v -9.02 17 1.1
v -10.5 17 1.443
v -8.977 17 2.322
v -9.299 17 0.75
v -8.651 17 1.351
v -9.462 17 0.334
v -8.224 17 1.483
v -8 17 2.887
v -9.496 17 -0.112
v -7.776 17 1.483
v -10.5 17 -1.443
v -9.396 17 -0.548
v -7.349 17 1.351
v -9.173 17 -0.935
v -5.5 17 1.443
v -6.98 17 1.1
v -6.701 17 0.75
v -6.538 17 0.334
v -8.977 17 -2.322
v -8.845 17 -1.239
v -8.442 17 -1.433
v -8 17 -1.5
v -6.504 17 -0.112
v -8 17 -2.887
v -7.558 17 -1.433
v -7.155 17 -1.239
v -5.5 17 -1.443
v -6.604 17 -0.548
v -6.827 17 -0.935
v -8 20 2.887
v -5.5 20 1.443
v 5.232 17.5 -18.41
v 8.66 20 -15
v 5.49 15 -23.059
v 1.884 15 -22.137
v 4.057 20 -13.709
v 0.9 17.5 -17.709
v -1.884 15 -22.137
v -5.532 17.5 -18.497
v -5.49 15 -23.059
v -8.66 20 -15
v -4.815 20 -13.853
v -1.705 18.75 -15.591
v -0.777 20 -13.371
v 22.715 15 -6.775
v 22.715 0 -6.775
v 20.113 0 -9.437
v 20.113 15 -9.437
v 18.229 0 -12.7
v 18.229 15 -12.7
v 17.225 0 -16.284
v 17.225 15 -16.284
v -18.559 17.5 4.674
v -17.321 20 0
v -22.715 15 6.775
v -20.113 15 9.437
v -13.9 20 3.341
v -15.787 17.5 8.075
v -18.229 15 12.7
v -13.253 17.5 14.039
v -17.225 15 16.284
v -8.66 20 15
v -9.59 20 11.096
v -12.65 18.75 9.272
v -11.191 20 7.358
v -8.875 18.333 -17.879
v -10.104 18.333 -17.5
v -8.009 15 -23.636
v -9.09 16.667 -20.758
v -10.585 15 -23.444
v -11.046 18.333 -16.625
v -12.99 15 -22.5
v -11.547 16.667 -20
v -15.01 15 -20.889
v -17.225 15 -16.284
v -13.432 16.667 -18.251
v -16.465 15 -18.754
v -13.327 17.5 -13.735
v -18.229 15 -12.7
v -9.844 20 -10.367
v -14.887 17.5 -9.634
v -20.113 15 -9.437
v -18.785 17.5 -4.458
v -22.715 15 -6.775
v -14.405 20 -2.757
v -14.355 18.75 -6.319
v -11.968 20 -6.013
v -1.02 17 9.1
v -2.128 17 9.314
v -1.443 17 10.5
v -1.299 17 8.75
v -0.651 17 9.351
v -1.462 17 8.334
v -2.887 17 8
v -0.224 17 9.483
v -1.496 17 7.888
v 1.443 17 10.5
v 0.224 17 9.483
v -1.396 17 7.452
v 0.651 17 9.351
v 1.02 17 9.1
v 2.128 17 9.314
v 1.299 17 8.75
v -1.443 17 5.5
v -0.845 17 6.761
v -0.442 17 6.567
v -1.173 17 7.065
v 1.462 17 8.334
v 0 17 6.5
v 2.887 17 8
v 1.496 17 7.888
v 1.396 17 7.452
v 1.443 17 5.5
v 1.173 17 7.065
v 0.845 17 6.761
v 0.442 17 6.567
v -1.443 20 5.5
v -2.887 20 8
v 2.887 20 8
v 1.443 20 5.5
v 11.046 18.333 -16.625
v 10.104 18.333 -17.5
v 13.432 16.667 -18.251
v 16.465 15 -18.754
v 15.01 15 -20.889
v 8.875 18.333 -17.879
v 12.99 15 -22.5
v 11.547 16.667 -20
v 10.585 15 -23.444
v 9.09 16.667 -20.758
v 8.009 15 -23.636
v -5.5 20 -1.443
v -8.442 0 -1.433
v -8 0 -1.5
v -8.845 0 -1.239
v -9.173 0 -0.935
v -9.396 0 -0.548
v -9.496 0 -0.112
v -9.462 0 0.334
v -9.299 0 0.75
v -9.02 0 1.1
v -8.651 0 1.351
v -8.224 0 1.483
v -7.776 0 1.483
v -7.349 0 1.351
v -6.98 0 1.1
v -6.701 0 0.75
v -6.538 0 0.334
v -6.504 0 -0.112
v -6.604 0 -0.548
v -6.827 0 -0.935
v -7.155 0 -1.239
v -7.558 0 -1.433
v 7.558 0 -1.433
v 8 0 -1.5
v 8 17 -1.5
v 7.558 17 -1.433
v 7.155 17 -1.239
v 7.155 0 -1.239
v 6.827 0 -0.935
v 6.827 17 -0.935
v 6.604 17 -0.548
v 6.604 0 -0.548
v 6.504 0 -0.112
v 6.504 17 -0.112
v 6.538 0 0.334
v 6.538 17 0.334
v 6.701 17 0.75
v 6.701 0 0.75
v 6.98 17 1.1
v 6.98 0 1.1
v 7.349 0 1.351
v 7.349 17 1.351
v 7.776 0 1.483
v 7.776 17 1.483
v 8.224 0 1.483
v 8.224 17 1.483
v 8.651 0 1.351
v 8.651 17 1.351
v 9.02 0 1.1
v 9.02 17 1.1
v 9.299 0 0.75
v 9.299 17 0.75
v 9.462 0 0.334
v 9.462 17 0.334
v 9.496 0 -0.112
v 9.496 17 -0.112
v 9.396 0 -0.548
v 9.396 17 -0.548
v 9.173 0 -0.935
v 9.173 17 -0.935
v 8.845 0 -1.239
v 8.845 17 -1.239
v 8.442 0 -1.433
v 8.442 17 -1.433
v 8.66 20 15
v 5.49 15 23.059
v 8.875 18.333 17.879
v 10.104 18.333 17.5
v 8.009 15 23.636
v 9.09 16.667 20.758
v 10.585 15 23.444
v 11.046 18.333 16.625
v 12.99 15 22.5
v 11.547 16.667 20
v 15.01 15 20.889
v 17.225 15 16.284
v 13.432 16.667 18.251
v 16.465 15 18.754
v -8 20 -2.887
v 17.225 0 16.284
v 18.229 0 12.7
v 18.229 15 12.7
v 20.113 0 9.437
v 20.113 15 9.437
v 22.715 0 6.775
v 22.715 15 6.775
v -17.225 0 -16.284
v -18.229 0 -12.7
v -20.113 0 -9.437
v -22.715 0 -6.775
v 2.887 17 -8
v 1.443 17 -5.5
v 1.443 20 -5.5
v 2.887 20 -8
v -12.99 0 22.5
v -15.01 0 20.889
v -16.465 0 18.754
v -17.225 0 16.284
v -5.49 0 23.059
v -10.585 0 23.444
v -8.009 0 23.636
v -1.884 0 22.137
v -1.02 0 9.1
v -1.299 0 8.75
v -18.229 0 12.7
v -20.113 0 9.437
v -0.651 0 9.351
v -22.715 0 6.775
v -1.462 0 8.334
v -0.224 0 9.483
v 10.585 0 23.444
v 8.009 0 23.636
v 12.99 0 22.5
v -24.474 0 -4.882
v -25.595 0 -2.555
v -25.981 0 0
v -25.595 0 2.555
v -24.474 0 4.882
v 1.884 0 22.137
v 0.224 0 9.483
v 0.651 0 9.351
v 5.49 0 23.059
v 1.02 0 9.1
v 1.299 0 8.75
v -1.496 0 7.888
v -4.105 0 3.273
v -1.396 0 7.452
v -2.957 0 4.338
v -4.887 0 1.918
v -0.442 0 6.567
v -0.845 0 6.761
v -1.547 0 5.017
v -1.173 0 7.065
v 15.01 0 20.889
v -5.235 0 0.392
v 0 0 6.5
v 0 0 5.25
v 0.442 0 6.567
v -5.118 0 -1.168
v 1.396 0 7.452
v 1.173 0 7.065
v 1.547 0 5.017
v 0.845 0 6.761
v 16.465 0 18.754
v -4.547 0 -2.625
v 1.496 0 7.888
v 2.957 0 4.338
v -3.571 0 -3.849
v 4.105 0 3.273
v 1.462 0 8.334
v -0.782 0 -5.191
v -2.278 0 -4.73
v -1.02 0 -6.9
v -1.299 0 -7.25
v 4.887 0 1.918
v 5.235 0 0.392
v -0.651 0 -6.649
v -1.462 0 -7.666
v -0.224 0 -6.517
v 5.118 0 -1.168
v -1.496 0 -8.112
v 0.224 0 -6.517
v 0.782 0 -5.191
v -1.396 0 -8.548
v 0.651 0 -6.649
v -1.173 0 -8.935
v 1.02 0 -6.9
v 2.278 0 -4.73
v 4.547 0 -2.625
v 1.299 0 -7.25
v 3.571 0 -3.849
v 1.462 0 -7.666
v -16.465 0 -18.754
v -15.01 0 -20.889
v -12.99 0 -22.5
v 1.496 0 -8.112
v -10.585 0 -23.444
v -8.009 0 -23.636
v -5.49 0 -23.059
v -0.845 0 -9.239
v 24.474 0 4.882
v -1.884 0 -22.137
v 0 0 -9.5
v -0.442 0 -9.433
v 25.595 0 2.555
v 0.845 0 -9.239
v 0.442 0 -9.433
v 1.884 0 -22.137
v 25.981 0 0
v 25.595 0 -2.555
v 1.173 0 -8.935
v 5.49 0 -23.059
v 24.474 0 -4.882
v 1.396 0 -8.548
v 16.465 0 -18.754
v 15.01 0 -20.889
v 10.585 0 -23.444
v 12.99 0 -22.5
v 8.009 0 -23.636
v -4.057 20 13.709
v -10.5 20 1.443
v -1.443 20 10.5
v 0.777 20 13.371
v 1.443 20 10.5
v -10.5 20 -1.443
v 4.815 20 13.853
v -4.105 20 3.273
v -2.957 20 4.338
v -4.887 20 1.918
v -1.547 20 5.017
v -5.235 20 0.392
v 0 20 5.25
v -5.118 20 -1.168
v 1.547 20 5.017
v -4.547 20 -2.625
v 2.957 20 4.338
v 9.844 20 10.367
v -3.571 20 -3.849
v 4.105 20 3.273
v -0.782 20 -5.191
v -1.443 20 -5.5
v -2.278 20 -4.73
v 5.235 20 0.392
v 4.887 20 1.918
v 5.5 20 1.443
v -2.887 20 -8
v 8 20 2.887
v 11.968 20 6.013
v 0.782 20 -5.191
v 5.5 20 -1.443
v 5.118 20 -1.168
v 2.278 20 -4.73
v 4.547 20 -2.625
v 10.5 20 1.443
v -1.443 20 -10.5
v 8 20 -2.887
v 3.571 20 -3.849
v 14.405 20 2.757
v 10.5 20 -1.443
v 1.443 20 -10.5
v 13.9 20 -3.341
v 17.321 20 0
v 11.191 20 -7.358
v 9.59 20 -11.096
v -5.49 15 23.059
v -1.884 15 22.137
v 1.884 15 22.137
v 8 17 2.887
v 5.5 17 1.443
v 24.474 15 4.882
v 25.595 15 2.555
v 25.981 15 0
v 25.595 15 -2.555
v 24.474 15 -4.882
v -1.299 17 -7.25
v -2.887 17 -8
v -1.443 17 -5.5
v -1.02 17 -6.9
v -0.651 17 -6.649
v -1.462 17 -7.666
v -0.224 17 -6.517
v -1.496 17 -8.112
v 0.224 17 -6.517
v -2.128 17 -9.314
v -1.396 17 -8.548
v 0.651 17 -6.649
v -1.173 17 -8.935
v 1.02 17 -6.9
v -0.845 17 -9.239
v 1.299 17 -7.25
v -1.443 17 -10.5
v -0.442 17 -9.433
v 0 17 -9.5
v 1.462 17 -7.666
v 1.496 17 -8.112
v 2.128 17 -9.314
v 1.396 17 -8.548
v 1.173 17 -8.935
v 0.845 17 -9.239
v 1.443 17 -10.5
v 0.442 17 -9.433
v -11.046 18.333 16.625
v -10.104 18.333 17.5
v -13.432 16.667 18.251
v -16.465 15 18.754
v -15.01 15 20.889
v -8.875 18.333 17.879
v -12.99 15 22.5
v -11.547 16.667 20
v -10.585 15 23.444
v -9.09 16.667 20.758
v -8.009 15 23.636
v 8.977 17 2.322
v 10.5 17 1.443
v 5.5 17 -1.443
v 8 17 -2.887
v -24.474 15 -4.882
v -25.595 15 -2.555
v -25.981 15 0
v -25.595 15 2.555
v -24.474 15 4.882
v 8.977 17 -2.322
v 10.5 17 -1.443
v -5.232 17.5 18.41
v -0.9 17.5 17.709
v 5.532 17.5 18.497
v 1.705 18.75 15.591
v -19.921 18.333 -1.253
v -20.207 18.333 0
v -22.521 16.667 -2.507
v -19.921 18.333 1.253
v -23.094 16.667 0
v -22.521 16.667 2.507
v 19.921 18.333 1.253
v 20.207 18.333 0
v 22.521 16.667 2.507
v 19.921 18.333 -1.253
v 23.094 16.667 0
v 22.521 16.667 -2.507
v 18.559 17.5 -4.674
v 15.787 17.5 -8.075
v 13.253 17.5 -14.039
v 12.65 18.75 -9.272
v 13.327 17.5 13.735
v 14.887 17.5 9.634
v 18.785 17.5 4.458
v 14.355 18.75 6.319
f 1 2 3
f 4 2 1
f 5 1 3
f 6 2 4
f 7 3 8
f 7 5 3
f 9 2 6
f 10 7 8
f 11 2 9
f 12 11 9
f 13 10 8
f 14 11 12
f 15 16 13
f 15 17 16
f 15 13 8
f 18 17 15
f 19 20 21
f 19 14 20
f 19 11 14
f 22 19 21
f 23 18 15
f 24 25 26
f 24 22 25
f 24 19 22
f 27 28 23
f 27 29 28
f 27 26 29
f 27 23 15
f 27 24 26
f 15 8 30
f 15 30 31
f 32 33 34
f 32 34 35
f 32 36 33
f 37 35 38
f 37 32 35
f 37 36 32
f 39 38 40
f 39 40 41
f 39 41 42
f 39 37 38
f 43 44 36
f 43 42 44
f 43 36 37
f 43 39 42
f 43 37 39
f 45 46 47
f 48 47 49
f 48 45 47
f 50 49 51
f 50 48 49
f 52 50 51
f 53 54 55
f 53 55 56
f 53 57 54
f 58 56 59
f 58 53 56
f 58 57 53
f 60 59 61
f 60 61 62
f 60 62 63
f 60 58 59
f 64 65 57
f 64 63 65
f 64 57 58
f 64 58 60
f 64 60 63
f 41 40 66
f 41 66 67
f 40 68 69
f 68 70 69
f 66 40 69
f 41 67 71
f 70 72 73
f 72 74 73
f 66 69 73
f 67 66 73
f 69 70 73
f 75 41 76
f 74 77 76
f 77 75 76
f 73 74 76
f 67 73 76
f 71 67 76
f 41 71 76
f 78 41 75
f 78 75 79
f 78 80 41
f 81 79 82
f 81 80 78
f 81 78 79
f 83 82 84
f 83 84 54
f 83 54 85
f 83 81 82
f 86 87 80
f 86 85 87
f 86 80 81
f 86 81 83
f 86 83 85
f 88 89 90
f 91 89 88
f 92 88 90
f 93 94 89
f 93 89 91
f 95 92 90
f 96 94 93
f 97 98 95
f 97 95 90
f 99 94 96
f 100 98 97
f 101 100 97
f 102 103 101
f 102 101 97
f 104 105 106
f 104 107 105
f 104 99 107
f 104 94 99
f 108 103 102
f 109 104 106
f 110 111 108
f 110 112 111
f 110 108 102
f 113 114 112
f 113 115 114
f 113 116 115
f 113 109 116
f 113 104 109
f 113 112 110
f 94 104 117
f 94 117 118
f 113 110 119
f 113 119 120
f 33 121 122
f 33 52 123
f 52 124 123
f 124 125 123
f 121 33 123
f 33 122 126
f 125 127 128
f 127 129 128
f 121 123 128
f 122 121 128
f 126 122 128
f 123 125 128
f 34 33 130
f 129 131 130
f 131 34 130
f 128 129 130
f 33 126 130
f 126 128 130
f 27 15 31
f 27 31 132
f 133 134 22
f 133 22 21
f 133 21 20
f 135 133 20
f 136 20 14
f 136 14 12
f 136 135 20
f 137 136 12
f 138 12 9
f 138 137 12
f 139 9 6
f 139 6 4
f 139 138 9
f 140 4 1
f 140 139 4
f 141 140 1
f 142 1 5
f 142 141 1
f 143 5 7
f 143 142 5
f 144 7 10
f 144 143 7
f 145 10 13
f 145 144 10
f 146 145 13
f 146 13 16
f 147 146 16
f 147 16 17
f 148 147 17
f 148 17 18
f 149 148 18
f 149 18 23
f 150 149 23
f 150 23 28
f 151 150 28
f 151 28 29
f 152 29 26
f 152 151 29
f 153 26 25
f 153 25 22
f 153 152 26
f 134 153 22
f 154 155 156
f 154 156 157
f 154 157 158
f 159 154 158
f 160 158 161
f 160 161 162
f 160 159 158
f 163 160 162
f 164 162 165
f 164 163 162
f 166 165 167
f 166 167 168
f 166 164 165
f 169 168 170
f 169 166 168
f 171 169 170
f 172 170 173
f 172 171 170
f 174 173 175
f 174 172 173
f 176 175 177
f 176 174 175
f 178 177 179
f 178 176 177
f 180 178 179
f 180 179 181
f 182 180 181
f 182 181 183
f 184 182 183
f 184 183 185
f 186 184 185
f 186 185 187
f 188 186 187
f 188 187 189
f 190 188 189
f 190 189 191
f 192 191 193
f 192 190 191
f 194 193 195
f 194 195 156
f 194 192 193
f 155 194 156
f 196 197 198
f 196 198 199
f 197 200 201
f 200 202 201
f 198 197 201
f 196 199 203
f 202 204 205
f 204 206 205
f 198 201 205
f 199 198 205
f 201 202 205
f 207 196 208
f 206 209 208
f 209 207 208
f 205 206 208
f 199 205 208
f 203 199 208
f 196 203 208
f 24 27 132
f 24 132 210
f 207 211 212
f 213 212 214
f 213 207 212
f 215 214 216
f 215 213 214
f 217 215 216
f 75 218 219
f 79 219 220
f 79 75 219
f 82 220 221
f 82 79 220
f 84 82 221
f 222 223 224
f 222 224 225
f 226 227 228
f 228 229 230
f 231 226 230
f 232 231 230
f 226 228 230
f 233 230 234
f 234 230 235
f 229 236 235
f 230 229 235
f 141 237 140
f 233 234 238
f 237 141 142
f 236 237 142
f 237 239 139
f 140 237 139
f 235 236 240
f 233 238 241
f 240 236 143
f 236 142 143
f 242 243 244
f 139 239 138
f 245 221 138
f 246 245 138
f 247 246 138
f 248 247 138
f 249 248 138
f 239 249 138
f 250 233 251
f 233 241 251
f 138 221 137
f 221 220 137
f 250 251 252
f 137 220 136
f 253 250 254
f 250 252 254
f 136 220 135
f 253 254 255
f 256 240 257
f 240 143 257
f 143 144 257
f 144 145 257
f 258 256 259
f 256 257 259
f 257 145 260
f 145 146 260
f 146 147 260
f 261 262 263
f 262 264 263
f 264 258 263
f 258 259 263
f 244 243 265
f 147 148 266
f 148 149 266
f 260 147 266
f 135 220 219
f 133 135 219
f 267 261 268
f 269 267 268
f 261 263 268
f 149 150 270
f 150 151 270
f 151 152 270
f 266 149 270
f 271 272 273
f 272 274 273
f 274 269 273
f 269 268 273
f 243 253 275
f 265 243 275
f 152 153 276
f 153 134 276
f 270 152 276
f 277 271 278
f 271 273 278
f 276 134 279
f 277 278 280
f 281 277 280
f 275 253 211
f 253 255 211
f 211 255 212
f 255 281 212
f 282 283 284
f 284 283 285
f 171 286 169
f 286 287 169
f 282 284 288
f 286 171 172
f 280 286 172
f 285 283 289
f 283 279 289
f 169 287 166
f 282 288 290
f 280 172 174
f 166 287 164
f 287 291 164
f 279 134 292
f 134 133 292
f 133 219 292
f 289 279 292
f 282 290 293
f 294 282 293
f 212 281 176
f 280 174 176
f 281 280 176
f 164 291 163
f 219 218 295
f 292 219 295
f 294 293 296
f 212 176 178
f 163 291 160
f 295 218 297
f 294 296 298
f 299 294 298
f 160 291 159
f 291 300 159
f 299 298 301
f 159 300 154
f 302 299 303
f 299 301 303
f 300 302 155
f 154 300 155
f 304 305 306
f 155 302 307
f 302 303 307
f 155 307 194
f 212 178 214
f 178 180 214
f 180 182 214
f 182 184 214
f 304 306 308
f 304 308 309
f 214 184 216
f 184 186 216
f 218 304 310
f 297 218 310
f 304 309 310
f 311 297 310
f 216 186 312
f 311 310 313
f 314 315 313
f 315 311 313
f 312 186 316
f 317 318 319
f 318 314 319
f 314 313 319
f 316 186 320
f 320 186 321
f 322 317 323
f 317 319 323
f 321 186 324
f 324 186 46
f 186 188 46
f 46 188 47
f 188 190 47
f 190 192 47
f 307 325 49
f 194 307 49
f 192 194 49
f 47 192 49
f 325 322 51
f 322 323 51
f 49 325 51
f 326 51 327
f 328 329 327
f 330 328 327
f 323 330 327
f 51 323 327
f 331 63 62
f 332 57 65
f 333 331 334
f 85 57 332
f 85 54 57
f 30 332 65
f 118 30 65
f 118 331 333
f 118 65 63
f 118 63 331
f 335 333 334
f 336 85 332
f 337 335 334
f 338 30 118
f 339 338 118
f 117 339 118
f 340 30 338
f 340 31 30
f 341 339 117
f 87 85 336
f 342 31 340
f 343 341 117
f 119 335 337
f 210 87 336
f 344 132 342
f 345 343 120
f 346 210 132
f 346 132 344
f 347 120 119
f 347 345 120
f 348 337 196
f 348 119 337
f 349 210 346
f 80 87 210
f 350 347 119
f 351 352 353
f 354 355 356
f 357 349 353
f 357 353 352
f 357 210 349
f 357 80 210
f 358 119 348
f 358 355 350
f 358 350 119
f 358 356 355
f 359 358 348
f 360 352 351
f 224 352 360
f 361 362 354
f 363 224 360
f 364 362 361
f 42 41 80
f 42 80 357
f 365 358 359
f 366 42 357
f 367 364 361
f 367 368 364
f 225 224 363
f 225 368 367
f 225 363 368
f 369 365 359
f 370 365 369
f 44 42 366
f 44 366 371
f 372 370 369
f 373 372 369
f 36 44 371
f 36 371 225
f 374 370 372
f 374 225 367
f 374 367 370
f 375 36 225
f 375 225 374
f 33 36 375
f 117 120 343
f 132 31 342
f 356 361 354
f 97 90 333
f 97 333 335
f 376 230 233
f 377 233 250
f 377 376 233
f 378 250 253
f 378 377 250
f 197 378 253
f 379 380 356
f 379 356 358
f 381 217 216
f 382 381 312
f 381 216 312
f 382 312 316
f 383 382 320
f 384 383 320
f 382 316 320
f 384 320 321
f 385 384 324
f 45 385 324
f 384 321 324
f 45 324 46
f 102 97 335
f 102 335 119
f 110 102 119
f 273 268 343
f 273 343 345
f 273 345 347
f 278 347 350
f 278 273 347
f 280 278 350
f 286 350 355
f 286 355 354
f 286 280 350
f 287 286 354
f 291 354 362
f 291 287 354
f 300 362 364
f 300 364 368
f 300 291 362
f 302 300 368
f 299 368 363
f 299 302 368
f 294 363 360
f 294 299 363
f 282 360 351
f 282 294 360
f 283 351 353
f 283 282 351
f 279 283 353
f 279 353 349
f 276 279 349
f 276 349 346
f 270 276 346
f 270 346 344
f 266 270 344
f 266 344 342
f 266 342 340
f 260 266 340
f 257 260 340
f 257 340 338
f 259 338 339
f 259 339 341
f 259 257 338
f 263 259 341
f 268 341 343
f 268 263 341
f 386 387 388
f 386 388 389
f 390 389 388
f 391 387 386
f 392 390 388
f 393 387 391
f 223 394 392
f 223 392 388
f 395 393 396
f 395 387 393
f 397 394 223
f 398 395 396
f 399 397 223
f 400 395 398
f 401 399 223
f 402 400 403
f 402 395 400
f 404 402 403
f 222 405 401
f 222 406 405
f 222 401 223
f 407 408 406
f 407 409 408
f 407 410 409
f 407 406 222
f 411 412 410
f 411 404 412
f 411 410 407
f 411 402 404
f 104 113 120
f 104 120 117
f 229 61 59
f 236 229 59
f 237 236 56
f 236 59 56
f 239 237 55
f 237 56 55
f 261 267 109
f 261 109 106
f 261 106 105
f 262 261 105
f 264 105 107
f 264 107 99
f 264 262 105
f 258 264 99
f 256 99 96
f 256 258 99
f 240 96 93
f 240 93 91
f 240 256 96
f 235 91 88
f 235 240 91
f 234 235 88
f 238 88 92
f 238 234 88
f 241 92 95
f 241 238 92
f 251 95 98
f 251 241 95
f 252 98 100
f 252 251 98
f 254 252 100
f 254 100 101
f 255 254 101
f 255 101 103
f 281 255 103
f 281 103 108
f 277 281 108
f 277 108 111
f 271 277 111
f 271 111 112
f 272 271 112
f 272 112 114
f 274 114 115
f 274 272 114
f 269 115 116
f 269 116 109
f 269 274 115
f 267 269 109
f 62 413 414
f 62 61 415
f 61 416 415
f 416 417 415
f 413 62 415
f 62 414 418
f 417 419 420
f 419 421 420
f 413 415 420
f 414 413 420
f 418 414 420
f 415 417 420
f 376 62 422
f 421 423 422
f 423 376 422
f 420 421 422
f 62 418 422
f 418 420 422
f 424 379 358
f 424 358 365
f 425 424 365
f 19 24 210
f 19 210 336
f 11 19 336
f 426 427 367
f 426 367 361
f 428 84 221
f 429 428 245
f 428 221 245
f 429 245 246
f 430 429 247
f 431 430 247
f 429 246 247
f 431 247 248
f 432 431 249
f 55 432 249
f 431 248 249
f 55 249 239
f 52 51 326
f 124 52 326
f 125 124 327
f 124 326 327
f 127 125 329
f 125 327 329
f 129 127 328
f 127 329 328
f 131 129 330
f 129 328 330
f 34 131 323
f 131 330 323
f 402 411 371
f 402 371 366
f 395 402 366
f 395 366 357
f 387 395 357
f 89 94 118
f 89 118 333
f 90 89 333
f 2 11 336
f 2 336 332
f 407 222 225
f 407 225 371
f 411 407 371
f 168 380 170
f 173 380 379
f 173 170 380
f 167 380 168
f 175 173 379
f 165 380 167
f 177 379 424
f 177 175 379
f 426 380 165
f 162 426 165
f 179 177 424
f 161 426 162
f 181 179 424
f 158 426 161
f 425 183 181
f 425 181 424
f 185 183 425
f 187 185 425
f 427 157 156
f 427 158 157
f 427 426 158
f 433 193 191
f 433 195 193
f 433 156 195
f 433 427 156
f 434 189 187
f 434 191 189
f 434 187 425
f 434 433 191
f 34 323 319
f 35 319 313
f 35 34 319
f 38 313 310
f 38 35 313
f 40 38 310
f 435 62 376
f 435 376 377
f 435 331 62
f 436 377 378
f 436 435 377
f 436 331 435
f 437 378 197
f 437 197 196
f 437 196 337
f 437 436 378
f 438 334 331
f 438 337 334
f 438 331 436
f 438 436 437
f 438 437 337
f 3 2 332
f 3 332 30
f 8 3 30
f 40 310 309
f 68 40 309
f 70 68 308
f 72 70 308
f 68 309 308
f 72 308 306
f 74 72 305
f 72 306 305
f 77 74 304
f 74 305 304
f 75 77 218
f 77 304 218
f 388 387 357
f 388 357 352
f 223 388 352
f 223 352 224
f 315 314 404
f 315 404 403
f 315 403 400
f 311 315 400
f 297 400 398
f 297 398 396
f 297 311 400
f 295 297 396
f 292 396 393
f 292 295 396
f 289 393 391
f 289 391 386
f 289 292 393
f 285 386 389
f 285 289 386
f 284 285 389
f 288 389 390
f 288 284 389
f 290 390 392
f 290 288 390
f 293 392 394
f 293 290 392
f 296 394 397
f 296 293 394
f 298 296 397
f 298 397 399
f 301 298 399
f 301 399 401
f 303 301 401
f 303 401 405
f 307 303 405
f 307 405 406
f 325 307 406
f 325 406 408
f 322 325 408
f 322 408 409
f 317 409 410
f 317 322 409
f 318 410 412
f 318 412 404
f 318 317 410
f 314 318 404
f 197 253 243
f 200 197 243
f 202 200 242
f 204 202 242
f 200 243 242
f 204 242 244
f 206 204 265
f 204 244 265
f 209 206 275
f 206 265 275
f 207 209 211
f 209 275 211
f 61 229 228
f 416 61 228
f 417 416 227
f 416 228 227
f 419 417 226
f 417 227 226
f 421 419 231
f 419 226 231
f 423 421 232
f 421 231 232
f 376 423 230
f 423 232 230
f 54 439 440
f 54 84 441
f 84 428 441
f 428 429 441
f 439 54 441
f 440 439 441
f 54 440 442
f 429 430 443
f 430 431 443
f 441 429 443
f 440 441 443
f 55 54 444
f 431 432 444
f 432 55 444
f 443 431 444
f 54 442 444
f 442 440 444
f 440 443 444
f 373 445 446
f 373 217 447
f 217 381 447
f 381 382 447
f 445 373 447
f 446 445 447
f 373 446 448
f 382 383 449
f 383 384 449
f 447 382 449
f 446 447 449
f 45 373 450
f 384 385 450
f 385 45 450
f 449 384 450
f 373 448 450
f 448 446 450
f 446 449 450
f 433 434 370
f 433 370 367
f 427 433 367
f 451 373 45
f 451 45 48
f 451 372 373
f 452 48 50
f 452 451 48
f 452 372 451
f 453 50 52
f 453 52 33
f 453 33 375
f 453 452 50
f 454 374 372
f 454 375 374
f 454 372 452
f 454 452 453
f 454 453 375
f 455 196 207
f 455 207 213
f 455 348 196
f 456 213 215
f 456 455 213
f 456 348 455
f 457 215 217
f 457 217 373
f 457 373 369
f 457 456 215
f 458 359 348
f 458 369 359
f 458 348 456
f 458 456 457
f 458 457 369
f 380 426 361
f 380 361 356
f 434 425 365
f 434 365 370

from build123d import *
from OCP.BRepFilletAPI import BRepFilletAPI_MakeChamfer

# Parameters (mm, degrees)
SKETCH1_R           = 5.25
BOSS_EXTRUDE1_DEPTH = 20
SKETCH1_3_R         = 1.5
BOSS_EXTRUDE2_DEPTH = 17
FILLET1_R           = 15
CHAMFER1_SIZE       = 8.660254038
CHAMFER1_SIZE_2     = 5


with BuildPart() as part:
    # Sketch1 → Boss-Extrude1 (new body)
    # profile 1 of 7: a face of its own
    with BuildSketch(Plane(origin=(0, 0, 0), x_dir=(1, 0, 0), z_dir=(0, 1, 0))):
        with BuildLine():
            Line((-17.320508076, 0), (-12.990381057, 7.5))
            ThreePointArc((-12.990381057, 7.5), (-25.980762114, 0), (-12.990381057, -7.5))
            Line((-12.990381057, -7.5), (-17.320508076, 0))
        make_face()
    # profile 2 of 7: a face of its own
    with BuildSketch(Plane(origin=(0, 0, 0), x_dir=(1, 0, 0), z_dir=(0, 1, 0))):
        Polygon((17.320508076, 0), (8.660254038, 15), (-8.660254038, 15), (-17.320508076, 0), (-8.660254038, -15), (8.660254038, -15), align=None)
        with Locations(Location((0, 0, 0), (0, 0, 270))):
            Circle(SKETCH1_R, mode=Mode.SUBTRACT)
        Polygon((1.443375673, -5.5), (-1.443375673, -5.5), (-2.886751346, -8), (-1.443375673, -10.5), (1.443375673, -10.5), (2.886751346, -8), align=None, mode=Mode.SUBTRACT)
        Polygon((8, 2.886751346), (5.5, 1.443375673), (5.5, -1.443375673), (8, -2.886751346), (10.5, -1.443375673), (10.5, 1.443375673), align=None, mode=Mode.SUBTRACT)
        Polygon((2.886751346, 8), (1.443375673, 10.5), (-1.443375673, 10.5), (-2.886751346, 8), (-1.443375673, 5.5), (1.443375673, 5.5), align=None, mode=Mode.SUBTRACT)
        Polygon((-8, 2.886751346), (-10.5, 1.443375673), (-10.5, -1.443375673), (-8, -2.886751346), (-5.5, -1.443375673), (-5.5, 1.443375673), align=None, mode=Mode.SUBTRACT)
    # profile 3 of 7: a face of its own
    with BuildSketch(Plane(origin=(0, 0, 0), x_dir=(1, 0, 0), z_dir=(0, 1, 0))):
        with BuildLine():
            Line((-12.990381057, 7.5), (-8.660254038, 15))
            Line((-8.660254038, 15), (0, 15))
            ThreePointArc((0, 15), (-12.990381057, 22.5), (-12.990381057, 7.5))
        make_face()
    # profile 4 of 7: a face of its own
    with BuildSketch(Plane(origin=(0, 0, 0), x_dir=(1, 0, 0), z_dir=(0, 1, 0))):
        with BuildLine():
            ThreePointArc((12.990381057, 7.5), (12.990381057, 22.5), (0, 15))
            Line((0, 15), (8.660254038, 15))
            Line((8.660254038, 15), (12.990381057, 7.5))
        make_face()
    # profile 5 of 7: a face of its own
    with BuildSketch(Plane(origin=(0, 0, 0), x_dir=(1, 0, 0), z_dir=(0, 1, 0))):
        with BuildLine():
            ThreePointArc((12.990381057, -7.5), (25.980762114, 0), (12.990381057, 7.5))
            Line((12.990381057, 7.5), (17.320508076, 0))
            Line((17.320508076, 0), (12.990381057, -7.5))
        make_face()
    # profile 6 of 7: a face of its own
    with BuildSketch(Plane(origin=(0, 0, 0), x_dir=(1, 0, 0), z_dir=(0, 1, 0))):
        with BuildLine():
            Line((8.660254038, -15), (0, -15))
            ThreePointArc((0, -15), (12.990381057, -22.5), (12.990381057, -7.5))
            Line((12.990381057, -7.5), (8.660254038, -15))
        make_face()
    # profile 7 of 7: a face of its own
    with BuildSketch(Plane(origin=(0, 0, 0), x_dir=(1, 0, 0), z_dir=(0, 1, 0))):
        with BuildLine():
            Line((-8.660254038, -15), (-12.990381057, -7.5))
            ThreePointArc((-12.990381057, -7.5), (-12.990381057, -22.5), (0, -15))
            Line((0, -15), (-8.660254038, -15))
        make_face()
    extrude(amount=BOSS_EXTRUDE1_DEPTH)

    # Sketch1<3> → Boss-Extrude2 (add)
    # profile 1 of 4: a face of its own
    with BuildSketch(Plane(origin=(0, 0, 0), x_dir=(1, 0, 0), z_dir=(0, 1, 0))):
        Polygon((-8.977463126, 2.322412747), (-10.5, 1.443375673), (-10.5, -1.443375673), (-8.977463126, -2.322412747), (-8, -2.886751346), (-5.5, -1.443375673), (-5.5, 1.443375673), (-8, 2.886751346), align=None)
        with Locations(Location((-8, 0, 0), (0, 0, 90))):
            Circle(SKETCH1_3_R, mode=Mode.SUBTRACT)
    # profile 2 of 4: a face of its own
    with BuildSketch(Plane(origin=(0, 0, 0), x_dir=(1, 0, 0), z_dir=(0, 1, 0))):
        Polygon((2.128194303, 9.313859338), (1.443375673, 10.5), (-1.443375673, 10.5), (-2.128194303, 9.313859338), (-2.886751346, 8), (-1.443375673, 5.5), (1.443375673, 5.5), (2.886751346, 8), align=None)
        with Locations(Location((0, 8, 0), (0, 0, 90))):
            Circle(SKETCH1_3_R, mode=Mode.SUBTRACT)
    # profile 3 of 4: a face of its own
    with BuildSketch(Plane(origin=(0, 0, 0), x_dir=(1, 0, 0), z_dir=(0, 1, 0))):
        Polygon((8, 2.886751346), (5.5, 1.443375673), (5.5, -1.443375673), (8, -2.886751346), (8.977463126, -2.322412747), (10.5, -1.443375673), (10.5, 1.443375673), (8.977463126, 2.322412747), align=None)
        with Locations(Location((8, 0, 0), (0, 0, 90))):
            Circle(SKETCH1_3_R, mode=Mode.SUBTRACT)
    # profile 4 of 4: a face of its own
    with BuildSketch(Plane(origin=(0, 0, 0), x_dir=(1, 0, 0), z_dir=(0, 1, 0))):
        Polygon((1.443375673, -5.5), (-1.443375673, -5.5), (-2.886751346, -8), (-2.128194303, -9.313859338), (-1.443375673, -10.5), (1.443375673, -10.5), (2.128194303, -9.313859338), (2.886751346, -8), align=None)
        with Locations(Location((0, -8, 0), (0, 0, 90))):
            Circle(SKETCH1_3_R, mode=Mode.SUBTRACT)
    extrude(amount=BOSS_EXTRUDE2_DEPTH)

    # Fillet1
    fillet1_edges = [part.edges().sort_by_distance(p)[0] for p in [
        (12.990381057, 10, 7.5),
        (0, 10, 15),
        (-12.990381057, 10, 7.5),
        (-12.990381057, 10, -7.5),
        (0, 10, -15),
        (12.990381057, 10, -7.5),
    ]]
    fillet(fillet1_edges, radius=FILLET1_R)

    # Chamfer1
    chamfer1_edges_1 = [part.edges().sort_by_distance(p)[0] for p in [
        (12.990381057, 20, 22.5),
    ]]
    chamfer1_side_1 = [part.faces().sort_by_distance(p)[0] for p in [
        (12.940381057, 20, 22.41339746),
    ]]
    chamfer1_edges_2 = [part.edges().sort_by_distance(p)[0] for p in [
        (-12.990381057, 20, 22.5),
    ]]
    chamfer1_side_2 = [part.faces().sort_by_distance(p)[0] for p in [
        (-12.940381057, 20, 22.41339746),
    ]]
    chamfer1_edges_3 = [part.edges().sort_by_distance(p)[0] for p in [
        (25.980762114, 20, 0),
    ]]
    chamfer1_side_3 = [part.faces().sort_by_distance(p)[0] for p in [
        (25.880762114, 20, 0),
    ]]
    chamfer1_edges_4 = [part.edges().sort_by_distance(p)[0] for p in [
        (12.990381057, 20, -22.5),
    ]]
    chamfer1_side_4 = [part.faces().sort_by_distance(p)[0] for p in [
        (12.940381057, 20, -22.41339746),
    ]]
    chamfer1_edges_5 = [part.edges().sort_by_distance(p)[0] for p in [
        (-12.990381057, 20, -22.5),
    ]]
    chamfer1_side_5 = [part.faces().sort_by_distance(p)[0] for p in [
        (-12.940381057, 20, -22.41339746),
    ]]
    chamfer1_edges_6 = [part.edges().sort_by_distance(p)[0] for p in [
        (-25.980762114, 20, 0),
    ]]
    chamfer1_side_6 = [part.faces().sort_by_distance(p)[0] for p in [
        (-25.980762114, 19.9, 0),
    ]]
    chamfer1_edges_7 = [part.edges().sort_by_distance(p)[0] for p in [
        (0, 20, 22.018347375),
    ]]
    chamfer1_side_7 = [part.faces().sort_by_distance(p)[0] for p in [
        (0, 20, 21.918347375),
    ]]
    chamfer1_edges_8 = [part.edges().sort_by_distance(p)[0] for p in [
        (19.068448176, 20, 11.009173688),
    ]]
    chamfer1_side_8 = [part.faces().sort_by_distance(p)[0] for p in [
        (18.981845636, 20, 10.959173688),
    ]]
    chamfer1_edges_9 = [part.edges().sort_by_distance(p)[0] for p in [
        (19.068448176, 20, -11.009173688),
    ]]
    chamfer1_side_9 = [part.faces().sort_by_distance(p)[0] for p in [
        (18.981845636, 20, -10.959173688),
    ]]
    chamfer1_edges_10 = [part.edges().sort_by_distance(p)[0] for p in [
        (0, 20, -22.018347375),
    ]]
    chamfer1_side_10 = [part.faces().sort_by_distance(p)[0] for p in [
        (0, 20, -21.918347375),
    ]]
    chamfer1_edges_11 = [part.edges().sort_by_distance(p)[0] for p in [
        (-19.068448176, 20, -11.009173688),
    ]]
    chamfer1_side_11 = [part.faces().sort_by_distance(p)[0] for p in [
        (-19.068448176, 19.9, -11.009173688),
    ]]
    chamfer1_edges_12 = [part.edges().sort_by_distance(p)[0] for p in [
        (-19.068448176, 20, 11.009173688),
    ]]
    chamfer1_side_12 = [part.faces().sort_by_distance(p)[0] for p in [
        (-19.068448176, 19.9, 11.009173688),
    ]]
    chamfer1 = BRepFilletAPI_MakeChamfer(part.part.solid().wrapped)
    for e in chamfer1_edges_1:
        chamfer1.Add(CHAMFER1_SIZE - 0.0001, CHAMFER1_SIZE_2 - 0.0001, e.wrapped, chamfer1_side_1[0].wrapped)
    for e in chamfer1_edges_2:
        chamfer1.Add(CHAMFER1_SIZE - 0.0001, CHAMFER1_SIZE_2 - 0.0001, e.wrapped, chamfer1_side_2[0].wrapped)
    for e in chamfer1_edges_3:
        chamfer1.Add(CHAMFER1_SIZE - 0.0001, CHAMFER1_SIZE_2 - 0.0001, e.wrapped, chamfer1_side_3[0].wrapped)
    for e in chamfer1_edges_4:
        chamfer1.Add(CHAMFER1_SIZE - 0.0001, CHAMFER1_SIZE_2 - 0.0001, e.wrapped, chamfer1_side_4[0].wrapped)
    for e in chamfer1_edges_5:
        chamfer1.Add(CHAMFER1_SIZE - 0.0001, CHAMFER1_SIZE_2 - 0.0001, e.wrapped, chamfer1_side_5[0].wrapped)
    for e in chamfer1_edges_6:
        chamfer1.Add(CHAMFER1_SIZE_2 - 0.0001, CHAMFER1_SIZE - 0.0001, e.wrapped, chamfer1_side_6[0].wrapped)
    for e in chamfer1_edges_7:
        chamfer1.Add(CHAMFER1_SIZE - 0.0001, CHAMFER1_SIZE_2 - 0.0001, e.wrapped, chamfer1_side_7[0].wrapped)
    for e in chamfer1_edges_8:
        chamfer1.Add(CHAMFER1_SIZE - 0.0001, CHAMFER1_SIZE_2 - 0.0001, e.wrapped, chamfer1_side_8[0].wrapped)
    for e in chamfer1_edges_9:
        chamfer1.Add(CHAMFER1_SIZE - 0.0001, CHAMFER1_SIZE_2 - 0.0001, e.wrapped, chamfer1_side_9[0].wrapped)
    for e in chamfer1_edges_10:
        chamfer1.Add(CHAMFER1_SIZE - 0.0001, CHAMFER1_SIZE_2 - 0.0001, e.wrapped, chamfer1_side_10[0].wrapped)
    for e in chamfer1_edges_11:
        chamfer1.Add(CHAMFER1_SIZE_2 - 0.0001, CHAMFER1_SIZE - 0.0001, e.wrapped, chamfer1_side_11[0].wrapped)
    for e in chamfer1_edges_12:
        chamfer1.Add(CHAMFER1_SIZE_2 - 0.0001, CHAMFER1_SIZE - 0.0001, e.wrapped, chamfer1_side_12[0].wrapped)
    add(Compound.cast(chamfer1.Shape()), mode=Mode.REPLACE)  # a hair under: the kernel refuses the full size


solid = part.part
